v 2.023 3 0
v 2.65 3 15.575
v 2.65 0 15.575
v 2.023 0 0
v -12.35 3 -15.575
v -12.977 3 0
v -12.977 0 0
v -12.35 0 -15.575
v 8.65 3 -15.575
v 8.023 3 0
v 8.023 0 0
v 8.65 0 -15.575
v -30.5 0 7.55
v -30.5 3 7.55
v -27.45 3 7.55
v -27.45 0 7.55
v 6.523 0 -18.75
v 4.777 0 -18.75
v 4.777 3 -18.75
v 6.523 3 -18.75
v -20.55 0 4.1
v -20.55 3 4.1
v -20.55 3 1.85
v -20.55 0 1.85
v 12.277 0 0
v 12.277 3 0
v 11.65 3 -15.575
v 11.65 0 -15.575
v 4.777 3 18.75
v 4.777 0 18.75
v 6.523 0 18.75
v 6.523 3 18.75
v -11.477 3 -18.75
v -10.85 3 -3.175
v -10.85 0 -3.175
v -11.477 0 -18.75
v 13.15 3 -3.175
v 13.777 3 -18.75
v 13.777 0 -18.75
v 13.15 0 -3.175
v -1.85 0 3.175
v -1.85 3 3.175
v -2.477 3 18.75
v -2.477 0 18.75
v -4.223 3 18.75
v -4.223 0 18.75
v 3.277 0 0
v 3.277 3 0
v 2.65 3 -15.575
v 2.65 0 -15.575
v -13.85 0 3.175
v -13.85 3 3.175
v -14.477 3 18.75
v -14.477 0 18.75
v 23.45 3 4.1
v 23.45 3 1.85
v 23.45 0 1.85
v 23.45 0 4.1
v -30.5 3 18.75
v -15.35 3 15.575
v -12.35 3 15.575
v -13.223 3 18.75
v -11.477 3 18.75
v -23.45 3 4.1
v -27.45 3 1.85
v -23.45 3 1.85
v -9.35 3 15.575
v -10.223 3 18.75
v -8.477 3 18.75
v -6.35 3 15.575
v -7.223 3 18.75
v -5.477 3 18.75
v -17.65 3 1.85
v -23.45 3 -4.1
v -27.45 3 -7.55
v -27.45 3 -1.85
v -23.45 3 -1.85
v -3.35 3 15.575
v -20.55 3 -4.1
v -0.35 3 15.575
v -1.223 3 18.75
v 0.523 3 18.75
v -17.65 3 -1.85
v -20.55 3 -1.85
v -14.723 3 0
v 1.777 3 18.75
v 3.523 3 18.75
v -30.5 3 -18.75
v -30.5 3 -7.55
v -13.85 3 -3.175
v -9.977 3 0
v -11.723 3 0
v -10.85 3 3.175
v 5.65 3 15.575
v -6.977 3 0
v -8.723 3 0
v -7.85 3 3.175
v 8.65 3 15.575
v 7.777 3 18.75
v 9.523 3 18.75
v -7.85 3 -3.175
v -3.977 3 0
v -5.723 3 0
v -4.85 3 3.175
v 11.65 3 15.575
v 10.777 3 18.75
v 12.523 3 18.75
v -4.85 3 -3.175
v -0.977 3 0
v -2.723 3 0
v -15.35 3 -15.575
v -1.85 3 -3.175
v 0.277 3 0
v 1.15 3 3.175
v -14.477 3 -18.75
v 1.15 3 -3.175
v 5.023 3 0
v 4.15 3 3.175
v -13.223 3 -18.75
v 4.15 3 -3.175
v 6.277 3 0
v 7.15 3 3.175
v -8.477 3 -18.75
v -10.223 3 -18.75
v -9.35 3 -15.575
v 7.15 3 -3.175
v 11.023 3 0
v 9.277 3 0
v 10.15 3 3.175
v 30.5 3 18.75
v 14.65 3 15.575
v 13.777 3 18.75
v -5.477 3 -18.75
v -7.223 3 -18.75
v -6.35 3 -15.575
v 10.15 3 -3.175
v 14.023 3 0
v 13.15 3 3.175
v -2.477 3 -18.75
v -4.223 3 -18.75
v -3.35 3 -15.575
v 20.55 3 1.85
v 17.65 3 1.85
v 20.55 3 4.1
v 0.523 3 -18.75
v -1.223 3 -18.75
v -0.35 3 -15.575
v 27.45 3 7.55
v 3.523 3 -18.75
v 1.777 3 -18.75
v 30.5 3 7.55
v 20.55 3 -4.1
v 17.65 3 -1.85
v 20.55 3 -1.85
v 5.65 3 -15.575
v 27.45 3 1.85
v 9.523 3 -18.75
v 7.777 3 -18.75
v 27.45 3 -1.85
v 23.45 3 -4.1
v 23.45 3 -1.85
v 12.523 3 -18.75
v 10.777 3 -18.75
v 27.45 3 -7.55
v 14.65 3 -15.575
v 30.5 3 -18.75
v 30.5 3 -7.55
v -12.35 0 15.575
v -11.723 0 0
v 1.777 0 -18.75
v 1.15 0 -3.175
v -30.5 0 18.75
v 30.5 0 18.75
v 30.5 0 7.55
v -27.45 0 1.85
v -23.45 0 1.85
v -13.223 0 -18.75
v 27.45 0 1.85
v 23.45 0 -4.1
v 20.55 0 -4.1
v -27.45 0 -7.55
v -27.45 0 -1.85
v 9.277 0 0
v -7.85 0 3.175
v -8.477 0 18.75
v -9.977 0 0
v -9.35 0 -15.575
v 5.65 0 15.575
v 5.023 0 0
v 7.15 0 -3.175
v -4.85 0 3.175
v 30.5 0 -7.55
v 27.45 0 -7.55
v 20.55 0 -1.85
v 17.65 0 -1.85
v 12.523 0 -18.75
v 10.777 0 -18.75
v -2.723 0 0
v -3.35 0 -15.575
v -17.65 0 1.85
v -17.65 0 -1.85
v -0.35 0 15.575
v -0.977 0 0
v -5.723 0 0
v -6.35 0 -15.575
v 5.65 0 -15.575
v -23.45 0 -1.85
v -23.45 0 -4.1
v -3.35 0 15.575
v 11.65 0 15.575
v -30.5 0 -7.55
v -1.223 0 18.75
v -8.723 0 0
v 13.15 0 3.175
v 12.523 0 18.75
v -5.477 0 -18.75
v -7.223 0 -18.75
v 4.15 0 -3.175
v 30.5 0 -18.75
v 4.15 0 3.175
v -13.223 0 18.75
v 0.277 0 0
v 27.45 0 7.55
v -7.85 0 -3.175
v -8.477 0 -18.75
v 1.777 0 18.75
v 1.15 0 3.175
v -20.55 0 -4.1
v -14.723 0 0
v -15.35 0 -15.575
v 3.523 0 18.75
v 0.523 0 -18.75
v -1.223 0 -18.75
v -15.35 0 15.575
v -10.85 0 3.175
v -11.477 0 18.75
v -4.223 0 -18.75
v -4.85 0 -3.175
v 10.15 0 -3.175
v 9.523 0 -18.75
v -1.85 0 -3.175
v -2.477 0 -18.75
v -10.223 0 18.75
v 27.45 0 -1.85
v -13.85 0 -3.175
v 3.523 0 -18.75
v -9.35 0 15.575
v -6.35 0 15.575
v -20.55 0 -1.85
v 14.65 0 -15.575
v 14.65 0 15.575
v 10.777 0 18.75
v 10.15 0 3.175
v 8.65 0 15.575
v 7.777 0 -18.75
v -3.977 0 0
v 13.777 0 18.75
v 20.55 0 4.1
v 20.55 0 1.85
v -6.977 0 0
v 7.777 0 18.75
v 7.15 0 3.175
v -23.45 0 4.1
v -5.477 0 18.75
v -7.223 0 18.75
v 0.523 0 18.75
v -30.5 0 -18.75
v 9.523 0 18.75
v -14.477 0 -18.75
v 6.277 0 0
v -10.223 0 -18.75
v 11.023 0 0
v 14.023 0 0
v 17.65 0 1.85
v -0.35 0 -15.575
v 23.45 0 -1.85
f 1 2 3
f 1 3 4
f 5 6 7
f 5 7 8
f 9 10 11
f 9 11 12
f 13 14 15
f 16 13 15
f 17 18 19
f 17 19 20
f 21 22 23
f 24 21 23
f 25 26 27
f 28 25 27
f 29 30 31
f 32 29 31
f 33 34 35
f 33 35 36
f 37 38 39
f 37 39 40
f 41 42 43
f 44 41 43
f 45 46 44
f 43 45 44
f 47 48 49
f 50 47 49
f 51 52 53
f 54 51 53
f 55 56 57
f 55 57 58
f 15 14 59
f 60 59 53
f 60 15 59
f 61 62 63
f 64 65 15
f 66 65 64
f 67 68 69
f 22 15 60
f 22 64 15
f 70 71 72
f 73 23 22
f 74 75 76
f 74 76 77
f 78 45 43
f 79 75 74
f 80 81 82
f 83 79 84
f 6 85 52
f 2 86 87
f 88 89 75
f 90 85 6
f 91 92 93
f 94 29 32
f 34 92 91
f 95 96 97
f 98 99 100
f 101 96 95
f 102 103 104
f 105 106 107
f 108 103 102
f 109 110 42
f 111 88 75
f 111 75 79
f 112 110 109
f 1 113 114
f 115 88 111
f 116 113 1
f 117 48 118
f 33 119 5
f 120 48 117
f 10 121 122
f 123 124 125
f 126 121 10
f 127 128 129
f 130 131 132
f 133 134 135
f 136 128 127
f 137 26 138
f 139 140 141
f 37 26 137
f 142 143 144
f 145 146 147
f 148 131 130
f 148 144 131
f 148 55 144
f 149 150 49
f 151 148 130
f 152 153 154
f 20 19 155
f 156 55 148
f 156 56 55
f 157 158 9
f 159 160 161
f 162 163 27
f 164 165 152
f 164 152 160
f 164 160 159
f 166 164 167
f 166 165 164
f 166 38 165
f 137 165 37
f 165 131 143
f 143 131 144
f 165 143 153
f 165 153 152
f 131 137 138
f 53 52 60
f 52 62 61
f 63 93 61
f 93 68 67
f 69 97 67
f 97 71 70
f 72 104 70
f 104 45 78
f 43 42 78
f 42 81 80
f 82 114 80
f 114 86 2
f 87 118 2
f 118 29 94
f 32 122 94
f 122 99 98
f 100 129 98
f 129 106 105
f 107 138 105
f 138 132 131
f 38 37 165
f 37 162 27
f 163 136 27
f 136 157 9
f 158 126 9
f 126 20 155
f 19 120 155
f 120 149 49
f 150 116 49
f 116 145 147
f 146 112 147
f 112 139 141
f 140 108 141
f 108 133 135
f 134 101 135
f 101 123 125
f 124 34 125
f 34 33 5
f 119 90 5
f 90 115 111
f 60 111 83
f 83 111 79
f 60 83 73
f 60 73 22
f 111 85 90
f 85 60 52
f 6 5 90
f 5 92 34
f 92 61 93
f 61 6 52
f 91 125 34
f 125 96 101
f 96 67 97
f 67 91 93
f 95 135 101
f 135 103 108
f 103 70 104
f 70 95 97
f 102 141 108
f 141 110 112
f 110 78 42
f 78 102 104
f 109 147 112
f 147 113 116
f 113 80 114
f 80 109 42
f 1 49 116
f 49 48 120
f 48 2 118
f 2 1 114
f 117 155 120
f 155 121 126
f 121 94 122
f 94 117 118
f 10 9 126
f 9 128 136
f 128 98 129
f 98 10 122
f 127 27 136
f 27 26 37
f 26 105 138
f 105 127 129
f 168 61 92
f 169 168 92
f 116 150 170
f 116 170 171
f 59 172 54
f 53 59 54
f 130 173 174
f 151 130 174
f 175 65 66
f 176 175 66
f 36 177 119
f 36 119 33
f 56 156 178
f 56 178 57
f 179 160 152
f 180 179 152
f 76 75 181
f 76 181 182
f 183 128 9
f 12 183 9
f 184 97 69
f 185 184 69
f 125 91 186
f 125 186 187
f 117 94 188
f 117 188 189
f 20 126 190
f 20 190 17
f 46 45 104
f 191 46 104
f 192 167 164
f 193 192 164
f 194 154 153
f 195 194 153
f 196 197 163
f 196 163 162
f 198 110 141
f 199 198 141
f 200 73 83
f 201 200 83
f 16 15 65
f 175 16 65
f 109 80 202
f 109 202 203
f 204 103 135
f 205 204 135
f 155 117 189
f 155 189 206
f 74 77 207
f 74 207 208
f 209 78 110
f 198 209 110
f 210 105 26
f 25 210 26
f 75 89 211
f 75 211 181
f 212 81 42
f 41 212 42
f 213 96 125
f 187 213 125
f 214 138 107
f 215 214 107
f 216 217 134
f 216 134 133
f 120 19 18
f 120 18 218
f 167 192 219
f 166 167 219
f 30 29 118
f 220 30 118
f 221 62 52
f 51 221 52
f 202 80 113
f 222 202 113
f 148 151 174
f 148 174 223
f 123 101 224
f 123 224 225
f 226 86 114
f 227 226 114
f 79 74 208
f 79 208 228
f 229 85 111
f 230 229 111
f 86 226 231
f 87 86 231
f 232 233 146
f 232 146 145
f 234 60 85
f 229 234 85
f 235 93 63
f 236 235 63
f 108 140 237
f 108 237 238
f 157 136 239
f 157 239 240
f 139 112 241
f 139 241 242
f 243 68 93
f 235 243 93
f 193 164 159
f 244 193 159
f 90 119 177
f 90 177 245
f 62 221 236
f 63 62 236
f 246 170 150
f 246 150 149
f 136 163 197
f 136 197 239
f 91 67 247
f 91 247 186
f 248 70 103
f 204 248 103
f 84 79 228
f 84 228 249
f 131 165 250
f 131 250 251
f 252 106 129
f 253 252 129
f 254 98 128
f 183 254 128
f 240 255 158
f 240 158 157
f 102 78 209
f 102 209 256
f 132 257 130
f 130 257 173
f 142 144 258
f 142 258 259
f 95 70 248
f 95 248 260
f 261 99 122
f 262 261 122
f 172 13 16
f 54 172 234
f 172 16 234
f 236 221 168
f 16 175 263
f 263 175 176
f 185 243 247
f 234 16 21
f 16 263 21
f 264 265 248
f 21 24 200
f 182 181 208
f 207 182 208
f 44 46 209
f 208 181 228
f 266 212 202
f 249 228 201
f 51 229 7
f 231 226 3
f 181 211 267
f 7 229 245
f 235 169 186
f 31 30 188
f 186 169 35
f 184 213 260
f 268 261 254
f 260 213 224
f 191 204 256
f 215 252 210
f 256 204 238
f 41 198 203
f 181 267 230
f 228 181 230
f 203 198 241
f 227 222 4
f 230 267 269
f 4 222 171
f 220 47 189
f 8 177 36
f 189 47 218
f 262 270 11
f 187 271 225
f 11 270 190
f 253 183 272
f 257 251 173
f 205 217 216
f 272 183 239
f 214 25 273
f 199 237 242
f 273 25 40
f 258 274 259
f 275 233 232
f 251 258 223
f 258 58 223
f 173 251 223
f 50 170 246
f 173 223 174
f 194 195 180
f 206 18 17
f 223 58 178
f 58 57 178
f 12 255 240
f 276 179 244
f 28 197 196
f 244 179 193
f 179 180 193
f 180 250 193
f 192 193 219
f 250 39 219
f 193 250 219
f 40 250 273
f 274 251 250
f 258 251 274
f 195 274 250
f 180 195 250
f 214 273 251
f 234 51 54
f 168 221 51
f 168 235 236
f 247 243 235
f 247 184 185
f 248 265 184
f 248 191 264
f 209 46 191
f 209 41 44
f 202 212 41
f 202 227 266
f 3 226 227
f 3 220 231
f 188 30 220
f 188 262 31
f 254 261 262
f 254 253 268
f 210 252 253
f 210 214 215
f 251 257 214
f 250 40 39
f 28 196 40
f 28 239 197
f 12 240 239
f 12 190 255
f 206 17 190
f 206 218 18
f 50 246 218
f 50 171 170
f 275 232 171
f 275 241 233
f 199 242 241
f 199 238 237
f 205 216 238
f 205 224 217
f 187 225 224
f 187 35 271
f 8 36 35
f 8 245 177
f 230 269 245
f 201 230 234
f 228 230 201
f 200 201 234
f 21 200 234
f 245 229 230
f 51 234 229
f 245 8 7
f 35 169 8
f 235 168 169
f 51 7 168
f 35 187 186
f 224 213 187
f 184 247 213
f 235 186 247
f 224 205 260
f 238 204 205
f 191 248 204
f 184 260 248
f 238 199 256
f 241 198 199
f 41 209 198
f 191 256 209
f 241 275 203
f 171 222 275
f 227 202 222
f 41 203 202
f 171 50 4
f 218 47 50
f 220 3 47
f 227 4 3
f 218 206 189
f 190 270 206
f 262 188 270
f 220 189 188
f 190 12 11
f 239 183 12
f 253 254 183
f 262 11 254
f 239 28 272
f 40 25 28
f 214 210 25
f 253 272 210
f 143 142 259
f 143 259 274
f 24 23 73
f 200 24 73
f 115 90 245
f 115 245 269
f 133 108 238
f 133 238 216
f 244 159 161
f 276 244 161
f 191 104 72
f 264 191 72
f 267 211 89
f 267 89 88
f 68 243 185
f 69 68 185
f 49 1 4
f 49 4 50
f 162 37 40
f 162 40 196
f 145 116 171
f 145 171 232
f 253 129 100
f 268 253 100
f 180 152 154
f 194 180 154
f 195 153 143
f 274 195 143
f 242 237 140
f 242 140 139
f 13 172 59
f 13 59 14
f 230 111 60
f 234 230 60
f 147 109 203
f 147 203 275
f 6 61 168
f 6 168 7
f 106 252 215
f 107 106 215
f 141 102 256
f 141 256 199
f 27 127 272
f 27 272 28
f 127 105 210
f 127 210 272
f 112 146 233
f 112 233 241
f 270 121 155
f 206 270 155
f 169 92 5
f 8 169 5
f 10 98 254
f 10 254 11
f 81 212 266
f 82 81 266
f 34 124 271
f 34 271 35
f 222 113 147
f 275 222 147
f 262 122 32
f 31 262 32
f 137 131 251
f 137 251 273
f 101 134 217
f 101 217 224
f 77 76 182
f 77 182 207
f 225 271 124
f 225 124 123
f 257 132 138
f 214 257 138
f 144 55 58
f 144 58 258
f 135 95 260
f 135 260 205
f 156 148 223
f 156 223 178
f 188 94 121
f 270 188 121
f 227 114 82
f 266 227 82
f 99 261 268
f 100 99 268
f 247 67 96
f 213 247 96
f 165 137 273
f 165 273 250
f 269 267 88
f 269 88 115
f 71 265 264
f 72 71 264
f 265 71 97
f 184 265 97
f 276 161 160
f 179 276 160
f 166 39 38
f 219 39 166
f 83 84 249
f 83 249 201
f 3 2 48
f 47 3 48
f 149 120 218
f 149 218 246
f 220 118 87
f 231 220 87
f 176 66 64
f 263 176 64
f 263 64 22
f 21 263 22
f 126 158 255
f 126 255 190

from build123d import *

# Parameters (mm, degrees)
SKETCH1_W            = 61
SKETCH1_H            = 37.5
BOSS_EXTRUDE1_DEPTH  = 3
CUT_EXTRUDE2_DEPTH   = 36.927879147
MIRROR2_COPY_1_DEPTH = 36.927879147
CUT_EXTRUDE3_DEPTH   = 36.927879147
LPATTERN1_COUNT      = 10
LPATTERN1_PITCH      = 3


with BuildPart() as part:
    # Sketch1 → Boss-Extrude1 (new body)
    with BuildSketch(Plane(origin=(0, 0, 0), x_dir=(1, 0, 0), z_dir=(0, 1, 0))):
        Rectangle(SKETCH1_W, SKETCH1_H)
    extrude(amount=BOSS_EXTRUDE1_DEPTH)

    # Sketch3 → Cut-Extrude2 (cut, through all)
    with BuildSketch(Plane(origin=(0, 3, 0), x_dir=(1, 0, 0), z_dir=(0, 1, 0))):
        Polygon((30.5, 7.55), (27.45, 7.55), (27.45, 1.85), (23.45, 1.85), (23.45, 4.1), (20.55, 4.1), (20.55, 1.85), (17.65, 1.85), (17.65, 0), (30.5, 0), align=None)
    cut_extrude2 = extrude(amount=-CUT_EXTRUDE2_DEPTH, mode=Mode.SUBTRACT)

    # Mirror1: Cut-Extrude2 across plane
    add(cut_extrude2.mirror(Plane.XY), mode=Mode.SUBTRACT)

    # Mirror2: Cut-Extrude2 across plane
    add(cut_extrude2.mirror(Plane(origin=(0, 0, 0), x_dir=(0, 0, 1), z_dir=(1, 0, 0))), mode=Mode.SUBTRACT)

    # Mirror2 copy 1 sketch → Mirror2 copy 1 (cut, through all)
    with BuildSketch(Plane(origin=(0, 3, 0), x_dir=(-1, 0, 0), z_dir=(0, 1, 0))):
        Polygon((30.5, 7.55), (27.45, 7.55), (27.45, 1.85), (23.45, 1.85), (23.45, 4.1), (20.55, 4.1), (20.55, 1.85), (17.65, 1.85), (17.65, 0), (30.5, 0), align=None)
    extrude(amount=-MIRROR2_COPY_1_DEPTH, mode=Mode.SUBTRACT)

    # Sketch4 → Cut-Extrude3 (cut, through all)
    with BuildSketch(Plane(origin=(0, 3, 0), x_dir=(1, 0, 0), z_dir=(0, 1, 0))):
        Polygon((14.65, 15.575), (14.65, -15.575), (14.0229932, 0), align=None)
        Polygon((13.7770068, 18.75), (13.15, 3.175), (12.5229932, 18.75), align=None)
        Polygon((13.15, -3.175), (12.5229932, -18.75), (13.7770068, -18.75), align=None)
        Polygon((11.65, 15.575), (11.65, -15.575), (12.2770068, 0), align=None)
    cut_extrude3 = extrude(amount=-CUT_EXTRUDE3_DEPTH, mode=Mode.SUBTRACT)

    # LPattern1: Cut-Extrude3 ×10
    with Locations(*[(-i * LPATTERN1_PITCH, 0, 0) for i in range(1, LPATTERN1_COUNT)]):
        add(cut_extrude3, mode=Mode.SUBTRACT)


solid = part.part
